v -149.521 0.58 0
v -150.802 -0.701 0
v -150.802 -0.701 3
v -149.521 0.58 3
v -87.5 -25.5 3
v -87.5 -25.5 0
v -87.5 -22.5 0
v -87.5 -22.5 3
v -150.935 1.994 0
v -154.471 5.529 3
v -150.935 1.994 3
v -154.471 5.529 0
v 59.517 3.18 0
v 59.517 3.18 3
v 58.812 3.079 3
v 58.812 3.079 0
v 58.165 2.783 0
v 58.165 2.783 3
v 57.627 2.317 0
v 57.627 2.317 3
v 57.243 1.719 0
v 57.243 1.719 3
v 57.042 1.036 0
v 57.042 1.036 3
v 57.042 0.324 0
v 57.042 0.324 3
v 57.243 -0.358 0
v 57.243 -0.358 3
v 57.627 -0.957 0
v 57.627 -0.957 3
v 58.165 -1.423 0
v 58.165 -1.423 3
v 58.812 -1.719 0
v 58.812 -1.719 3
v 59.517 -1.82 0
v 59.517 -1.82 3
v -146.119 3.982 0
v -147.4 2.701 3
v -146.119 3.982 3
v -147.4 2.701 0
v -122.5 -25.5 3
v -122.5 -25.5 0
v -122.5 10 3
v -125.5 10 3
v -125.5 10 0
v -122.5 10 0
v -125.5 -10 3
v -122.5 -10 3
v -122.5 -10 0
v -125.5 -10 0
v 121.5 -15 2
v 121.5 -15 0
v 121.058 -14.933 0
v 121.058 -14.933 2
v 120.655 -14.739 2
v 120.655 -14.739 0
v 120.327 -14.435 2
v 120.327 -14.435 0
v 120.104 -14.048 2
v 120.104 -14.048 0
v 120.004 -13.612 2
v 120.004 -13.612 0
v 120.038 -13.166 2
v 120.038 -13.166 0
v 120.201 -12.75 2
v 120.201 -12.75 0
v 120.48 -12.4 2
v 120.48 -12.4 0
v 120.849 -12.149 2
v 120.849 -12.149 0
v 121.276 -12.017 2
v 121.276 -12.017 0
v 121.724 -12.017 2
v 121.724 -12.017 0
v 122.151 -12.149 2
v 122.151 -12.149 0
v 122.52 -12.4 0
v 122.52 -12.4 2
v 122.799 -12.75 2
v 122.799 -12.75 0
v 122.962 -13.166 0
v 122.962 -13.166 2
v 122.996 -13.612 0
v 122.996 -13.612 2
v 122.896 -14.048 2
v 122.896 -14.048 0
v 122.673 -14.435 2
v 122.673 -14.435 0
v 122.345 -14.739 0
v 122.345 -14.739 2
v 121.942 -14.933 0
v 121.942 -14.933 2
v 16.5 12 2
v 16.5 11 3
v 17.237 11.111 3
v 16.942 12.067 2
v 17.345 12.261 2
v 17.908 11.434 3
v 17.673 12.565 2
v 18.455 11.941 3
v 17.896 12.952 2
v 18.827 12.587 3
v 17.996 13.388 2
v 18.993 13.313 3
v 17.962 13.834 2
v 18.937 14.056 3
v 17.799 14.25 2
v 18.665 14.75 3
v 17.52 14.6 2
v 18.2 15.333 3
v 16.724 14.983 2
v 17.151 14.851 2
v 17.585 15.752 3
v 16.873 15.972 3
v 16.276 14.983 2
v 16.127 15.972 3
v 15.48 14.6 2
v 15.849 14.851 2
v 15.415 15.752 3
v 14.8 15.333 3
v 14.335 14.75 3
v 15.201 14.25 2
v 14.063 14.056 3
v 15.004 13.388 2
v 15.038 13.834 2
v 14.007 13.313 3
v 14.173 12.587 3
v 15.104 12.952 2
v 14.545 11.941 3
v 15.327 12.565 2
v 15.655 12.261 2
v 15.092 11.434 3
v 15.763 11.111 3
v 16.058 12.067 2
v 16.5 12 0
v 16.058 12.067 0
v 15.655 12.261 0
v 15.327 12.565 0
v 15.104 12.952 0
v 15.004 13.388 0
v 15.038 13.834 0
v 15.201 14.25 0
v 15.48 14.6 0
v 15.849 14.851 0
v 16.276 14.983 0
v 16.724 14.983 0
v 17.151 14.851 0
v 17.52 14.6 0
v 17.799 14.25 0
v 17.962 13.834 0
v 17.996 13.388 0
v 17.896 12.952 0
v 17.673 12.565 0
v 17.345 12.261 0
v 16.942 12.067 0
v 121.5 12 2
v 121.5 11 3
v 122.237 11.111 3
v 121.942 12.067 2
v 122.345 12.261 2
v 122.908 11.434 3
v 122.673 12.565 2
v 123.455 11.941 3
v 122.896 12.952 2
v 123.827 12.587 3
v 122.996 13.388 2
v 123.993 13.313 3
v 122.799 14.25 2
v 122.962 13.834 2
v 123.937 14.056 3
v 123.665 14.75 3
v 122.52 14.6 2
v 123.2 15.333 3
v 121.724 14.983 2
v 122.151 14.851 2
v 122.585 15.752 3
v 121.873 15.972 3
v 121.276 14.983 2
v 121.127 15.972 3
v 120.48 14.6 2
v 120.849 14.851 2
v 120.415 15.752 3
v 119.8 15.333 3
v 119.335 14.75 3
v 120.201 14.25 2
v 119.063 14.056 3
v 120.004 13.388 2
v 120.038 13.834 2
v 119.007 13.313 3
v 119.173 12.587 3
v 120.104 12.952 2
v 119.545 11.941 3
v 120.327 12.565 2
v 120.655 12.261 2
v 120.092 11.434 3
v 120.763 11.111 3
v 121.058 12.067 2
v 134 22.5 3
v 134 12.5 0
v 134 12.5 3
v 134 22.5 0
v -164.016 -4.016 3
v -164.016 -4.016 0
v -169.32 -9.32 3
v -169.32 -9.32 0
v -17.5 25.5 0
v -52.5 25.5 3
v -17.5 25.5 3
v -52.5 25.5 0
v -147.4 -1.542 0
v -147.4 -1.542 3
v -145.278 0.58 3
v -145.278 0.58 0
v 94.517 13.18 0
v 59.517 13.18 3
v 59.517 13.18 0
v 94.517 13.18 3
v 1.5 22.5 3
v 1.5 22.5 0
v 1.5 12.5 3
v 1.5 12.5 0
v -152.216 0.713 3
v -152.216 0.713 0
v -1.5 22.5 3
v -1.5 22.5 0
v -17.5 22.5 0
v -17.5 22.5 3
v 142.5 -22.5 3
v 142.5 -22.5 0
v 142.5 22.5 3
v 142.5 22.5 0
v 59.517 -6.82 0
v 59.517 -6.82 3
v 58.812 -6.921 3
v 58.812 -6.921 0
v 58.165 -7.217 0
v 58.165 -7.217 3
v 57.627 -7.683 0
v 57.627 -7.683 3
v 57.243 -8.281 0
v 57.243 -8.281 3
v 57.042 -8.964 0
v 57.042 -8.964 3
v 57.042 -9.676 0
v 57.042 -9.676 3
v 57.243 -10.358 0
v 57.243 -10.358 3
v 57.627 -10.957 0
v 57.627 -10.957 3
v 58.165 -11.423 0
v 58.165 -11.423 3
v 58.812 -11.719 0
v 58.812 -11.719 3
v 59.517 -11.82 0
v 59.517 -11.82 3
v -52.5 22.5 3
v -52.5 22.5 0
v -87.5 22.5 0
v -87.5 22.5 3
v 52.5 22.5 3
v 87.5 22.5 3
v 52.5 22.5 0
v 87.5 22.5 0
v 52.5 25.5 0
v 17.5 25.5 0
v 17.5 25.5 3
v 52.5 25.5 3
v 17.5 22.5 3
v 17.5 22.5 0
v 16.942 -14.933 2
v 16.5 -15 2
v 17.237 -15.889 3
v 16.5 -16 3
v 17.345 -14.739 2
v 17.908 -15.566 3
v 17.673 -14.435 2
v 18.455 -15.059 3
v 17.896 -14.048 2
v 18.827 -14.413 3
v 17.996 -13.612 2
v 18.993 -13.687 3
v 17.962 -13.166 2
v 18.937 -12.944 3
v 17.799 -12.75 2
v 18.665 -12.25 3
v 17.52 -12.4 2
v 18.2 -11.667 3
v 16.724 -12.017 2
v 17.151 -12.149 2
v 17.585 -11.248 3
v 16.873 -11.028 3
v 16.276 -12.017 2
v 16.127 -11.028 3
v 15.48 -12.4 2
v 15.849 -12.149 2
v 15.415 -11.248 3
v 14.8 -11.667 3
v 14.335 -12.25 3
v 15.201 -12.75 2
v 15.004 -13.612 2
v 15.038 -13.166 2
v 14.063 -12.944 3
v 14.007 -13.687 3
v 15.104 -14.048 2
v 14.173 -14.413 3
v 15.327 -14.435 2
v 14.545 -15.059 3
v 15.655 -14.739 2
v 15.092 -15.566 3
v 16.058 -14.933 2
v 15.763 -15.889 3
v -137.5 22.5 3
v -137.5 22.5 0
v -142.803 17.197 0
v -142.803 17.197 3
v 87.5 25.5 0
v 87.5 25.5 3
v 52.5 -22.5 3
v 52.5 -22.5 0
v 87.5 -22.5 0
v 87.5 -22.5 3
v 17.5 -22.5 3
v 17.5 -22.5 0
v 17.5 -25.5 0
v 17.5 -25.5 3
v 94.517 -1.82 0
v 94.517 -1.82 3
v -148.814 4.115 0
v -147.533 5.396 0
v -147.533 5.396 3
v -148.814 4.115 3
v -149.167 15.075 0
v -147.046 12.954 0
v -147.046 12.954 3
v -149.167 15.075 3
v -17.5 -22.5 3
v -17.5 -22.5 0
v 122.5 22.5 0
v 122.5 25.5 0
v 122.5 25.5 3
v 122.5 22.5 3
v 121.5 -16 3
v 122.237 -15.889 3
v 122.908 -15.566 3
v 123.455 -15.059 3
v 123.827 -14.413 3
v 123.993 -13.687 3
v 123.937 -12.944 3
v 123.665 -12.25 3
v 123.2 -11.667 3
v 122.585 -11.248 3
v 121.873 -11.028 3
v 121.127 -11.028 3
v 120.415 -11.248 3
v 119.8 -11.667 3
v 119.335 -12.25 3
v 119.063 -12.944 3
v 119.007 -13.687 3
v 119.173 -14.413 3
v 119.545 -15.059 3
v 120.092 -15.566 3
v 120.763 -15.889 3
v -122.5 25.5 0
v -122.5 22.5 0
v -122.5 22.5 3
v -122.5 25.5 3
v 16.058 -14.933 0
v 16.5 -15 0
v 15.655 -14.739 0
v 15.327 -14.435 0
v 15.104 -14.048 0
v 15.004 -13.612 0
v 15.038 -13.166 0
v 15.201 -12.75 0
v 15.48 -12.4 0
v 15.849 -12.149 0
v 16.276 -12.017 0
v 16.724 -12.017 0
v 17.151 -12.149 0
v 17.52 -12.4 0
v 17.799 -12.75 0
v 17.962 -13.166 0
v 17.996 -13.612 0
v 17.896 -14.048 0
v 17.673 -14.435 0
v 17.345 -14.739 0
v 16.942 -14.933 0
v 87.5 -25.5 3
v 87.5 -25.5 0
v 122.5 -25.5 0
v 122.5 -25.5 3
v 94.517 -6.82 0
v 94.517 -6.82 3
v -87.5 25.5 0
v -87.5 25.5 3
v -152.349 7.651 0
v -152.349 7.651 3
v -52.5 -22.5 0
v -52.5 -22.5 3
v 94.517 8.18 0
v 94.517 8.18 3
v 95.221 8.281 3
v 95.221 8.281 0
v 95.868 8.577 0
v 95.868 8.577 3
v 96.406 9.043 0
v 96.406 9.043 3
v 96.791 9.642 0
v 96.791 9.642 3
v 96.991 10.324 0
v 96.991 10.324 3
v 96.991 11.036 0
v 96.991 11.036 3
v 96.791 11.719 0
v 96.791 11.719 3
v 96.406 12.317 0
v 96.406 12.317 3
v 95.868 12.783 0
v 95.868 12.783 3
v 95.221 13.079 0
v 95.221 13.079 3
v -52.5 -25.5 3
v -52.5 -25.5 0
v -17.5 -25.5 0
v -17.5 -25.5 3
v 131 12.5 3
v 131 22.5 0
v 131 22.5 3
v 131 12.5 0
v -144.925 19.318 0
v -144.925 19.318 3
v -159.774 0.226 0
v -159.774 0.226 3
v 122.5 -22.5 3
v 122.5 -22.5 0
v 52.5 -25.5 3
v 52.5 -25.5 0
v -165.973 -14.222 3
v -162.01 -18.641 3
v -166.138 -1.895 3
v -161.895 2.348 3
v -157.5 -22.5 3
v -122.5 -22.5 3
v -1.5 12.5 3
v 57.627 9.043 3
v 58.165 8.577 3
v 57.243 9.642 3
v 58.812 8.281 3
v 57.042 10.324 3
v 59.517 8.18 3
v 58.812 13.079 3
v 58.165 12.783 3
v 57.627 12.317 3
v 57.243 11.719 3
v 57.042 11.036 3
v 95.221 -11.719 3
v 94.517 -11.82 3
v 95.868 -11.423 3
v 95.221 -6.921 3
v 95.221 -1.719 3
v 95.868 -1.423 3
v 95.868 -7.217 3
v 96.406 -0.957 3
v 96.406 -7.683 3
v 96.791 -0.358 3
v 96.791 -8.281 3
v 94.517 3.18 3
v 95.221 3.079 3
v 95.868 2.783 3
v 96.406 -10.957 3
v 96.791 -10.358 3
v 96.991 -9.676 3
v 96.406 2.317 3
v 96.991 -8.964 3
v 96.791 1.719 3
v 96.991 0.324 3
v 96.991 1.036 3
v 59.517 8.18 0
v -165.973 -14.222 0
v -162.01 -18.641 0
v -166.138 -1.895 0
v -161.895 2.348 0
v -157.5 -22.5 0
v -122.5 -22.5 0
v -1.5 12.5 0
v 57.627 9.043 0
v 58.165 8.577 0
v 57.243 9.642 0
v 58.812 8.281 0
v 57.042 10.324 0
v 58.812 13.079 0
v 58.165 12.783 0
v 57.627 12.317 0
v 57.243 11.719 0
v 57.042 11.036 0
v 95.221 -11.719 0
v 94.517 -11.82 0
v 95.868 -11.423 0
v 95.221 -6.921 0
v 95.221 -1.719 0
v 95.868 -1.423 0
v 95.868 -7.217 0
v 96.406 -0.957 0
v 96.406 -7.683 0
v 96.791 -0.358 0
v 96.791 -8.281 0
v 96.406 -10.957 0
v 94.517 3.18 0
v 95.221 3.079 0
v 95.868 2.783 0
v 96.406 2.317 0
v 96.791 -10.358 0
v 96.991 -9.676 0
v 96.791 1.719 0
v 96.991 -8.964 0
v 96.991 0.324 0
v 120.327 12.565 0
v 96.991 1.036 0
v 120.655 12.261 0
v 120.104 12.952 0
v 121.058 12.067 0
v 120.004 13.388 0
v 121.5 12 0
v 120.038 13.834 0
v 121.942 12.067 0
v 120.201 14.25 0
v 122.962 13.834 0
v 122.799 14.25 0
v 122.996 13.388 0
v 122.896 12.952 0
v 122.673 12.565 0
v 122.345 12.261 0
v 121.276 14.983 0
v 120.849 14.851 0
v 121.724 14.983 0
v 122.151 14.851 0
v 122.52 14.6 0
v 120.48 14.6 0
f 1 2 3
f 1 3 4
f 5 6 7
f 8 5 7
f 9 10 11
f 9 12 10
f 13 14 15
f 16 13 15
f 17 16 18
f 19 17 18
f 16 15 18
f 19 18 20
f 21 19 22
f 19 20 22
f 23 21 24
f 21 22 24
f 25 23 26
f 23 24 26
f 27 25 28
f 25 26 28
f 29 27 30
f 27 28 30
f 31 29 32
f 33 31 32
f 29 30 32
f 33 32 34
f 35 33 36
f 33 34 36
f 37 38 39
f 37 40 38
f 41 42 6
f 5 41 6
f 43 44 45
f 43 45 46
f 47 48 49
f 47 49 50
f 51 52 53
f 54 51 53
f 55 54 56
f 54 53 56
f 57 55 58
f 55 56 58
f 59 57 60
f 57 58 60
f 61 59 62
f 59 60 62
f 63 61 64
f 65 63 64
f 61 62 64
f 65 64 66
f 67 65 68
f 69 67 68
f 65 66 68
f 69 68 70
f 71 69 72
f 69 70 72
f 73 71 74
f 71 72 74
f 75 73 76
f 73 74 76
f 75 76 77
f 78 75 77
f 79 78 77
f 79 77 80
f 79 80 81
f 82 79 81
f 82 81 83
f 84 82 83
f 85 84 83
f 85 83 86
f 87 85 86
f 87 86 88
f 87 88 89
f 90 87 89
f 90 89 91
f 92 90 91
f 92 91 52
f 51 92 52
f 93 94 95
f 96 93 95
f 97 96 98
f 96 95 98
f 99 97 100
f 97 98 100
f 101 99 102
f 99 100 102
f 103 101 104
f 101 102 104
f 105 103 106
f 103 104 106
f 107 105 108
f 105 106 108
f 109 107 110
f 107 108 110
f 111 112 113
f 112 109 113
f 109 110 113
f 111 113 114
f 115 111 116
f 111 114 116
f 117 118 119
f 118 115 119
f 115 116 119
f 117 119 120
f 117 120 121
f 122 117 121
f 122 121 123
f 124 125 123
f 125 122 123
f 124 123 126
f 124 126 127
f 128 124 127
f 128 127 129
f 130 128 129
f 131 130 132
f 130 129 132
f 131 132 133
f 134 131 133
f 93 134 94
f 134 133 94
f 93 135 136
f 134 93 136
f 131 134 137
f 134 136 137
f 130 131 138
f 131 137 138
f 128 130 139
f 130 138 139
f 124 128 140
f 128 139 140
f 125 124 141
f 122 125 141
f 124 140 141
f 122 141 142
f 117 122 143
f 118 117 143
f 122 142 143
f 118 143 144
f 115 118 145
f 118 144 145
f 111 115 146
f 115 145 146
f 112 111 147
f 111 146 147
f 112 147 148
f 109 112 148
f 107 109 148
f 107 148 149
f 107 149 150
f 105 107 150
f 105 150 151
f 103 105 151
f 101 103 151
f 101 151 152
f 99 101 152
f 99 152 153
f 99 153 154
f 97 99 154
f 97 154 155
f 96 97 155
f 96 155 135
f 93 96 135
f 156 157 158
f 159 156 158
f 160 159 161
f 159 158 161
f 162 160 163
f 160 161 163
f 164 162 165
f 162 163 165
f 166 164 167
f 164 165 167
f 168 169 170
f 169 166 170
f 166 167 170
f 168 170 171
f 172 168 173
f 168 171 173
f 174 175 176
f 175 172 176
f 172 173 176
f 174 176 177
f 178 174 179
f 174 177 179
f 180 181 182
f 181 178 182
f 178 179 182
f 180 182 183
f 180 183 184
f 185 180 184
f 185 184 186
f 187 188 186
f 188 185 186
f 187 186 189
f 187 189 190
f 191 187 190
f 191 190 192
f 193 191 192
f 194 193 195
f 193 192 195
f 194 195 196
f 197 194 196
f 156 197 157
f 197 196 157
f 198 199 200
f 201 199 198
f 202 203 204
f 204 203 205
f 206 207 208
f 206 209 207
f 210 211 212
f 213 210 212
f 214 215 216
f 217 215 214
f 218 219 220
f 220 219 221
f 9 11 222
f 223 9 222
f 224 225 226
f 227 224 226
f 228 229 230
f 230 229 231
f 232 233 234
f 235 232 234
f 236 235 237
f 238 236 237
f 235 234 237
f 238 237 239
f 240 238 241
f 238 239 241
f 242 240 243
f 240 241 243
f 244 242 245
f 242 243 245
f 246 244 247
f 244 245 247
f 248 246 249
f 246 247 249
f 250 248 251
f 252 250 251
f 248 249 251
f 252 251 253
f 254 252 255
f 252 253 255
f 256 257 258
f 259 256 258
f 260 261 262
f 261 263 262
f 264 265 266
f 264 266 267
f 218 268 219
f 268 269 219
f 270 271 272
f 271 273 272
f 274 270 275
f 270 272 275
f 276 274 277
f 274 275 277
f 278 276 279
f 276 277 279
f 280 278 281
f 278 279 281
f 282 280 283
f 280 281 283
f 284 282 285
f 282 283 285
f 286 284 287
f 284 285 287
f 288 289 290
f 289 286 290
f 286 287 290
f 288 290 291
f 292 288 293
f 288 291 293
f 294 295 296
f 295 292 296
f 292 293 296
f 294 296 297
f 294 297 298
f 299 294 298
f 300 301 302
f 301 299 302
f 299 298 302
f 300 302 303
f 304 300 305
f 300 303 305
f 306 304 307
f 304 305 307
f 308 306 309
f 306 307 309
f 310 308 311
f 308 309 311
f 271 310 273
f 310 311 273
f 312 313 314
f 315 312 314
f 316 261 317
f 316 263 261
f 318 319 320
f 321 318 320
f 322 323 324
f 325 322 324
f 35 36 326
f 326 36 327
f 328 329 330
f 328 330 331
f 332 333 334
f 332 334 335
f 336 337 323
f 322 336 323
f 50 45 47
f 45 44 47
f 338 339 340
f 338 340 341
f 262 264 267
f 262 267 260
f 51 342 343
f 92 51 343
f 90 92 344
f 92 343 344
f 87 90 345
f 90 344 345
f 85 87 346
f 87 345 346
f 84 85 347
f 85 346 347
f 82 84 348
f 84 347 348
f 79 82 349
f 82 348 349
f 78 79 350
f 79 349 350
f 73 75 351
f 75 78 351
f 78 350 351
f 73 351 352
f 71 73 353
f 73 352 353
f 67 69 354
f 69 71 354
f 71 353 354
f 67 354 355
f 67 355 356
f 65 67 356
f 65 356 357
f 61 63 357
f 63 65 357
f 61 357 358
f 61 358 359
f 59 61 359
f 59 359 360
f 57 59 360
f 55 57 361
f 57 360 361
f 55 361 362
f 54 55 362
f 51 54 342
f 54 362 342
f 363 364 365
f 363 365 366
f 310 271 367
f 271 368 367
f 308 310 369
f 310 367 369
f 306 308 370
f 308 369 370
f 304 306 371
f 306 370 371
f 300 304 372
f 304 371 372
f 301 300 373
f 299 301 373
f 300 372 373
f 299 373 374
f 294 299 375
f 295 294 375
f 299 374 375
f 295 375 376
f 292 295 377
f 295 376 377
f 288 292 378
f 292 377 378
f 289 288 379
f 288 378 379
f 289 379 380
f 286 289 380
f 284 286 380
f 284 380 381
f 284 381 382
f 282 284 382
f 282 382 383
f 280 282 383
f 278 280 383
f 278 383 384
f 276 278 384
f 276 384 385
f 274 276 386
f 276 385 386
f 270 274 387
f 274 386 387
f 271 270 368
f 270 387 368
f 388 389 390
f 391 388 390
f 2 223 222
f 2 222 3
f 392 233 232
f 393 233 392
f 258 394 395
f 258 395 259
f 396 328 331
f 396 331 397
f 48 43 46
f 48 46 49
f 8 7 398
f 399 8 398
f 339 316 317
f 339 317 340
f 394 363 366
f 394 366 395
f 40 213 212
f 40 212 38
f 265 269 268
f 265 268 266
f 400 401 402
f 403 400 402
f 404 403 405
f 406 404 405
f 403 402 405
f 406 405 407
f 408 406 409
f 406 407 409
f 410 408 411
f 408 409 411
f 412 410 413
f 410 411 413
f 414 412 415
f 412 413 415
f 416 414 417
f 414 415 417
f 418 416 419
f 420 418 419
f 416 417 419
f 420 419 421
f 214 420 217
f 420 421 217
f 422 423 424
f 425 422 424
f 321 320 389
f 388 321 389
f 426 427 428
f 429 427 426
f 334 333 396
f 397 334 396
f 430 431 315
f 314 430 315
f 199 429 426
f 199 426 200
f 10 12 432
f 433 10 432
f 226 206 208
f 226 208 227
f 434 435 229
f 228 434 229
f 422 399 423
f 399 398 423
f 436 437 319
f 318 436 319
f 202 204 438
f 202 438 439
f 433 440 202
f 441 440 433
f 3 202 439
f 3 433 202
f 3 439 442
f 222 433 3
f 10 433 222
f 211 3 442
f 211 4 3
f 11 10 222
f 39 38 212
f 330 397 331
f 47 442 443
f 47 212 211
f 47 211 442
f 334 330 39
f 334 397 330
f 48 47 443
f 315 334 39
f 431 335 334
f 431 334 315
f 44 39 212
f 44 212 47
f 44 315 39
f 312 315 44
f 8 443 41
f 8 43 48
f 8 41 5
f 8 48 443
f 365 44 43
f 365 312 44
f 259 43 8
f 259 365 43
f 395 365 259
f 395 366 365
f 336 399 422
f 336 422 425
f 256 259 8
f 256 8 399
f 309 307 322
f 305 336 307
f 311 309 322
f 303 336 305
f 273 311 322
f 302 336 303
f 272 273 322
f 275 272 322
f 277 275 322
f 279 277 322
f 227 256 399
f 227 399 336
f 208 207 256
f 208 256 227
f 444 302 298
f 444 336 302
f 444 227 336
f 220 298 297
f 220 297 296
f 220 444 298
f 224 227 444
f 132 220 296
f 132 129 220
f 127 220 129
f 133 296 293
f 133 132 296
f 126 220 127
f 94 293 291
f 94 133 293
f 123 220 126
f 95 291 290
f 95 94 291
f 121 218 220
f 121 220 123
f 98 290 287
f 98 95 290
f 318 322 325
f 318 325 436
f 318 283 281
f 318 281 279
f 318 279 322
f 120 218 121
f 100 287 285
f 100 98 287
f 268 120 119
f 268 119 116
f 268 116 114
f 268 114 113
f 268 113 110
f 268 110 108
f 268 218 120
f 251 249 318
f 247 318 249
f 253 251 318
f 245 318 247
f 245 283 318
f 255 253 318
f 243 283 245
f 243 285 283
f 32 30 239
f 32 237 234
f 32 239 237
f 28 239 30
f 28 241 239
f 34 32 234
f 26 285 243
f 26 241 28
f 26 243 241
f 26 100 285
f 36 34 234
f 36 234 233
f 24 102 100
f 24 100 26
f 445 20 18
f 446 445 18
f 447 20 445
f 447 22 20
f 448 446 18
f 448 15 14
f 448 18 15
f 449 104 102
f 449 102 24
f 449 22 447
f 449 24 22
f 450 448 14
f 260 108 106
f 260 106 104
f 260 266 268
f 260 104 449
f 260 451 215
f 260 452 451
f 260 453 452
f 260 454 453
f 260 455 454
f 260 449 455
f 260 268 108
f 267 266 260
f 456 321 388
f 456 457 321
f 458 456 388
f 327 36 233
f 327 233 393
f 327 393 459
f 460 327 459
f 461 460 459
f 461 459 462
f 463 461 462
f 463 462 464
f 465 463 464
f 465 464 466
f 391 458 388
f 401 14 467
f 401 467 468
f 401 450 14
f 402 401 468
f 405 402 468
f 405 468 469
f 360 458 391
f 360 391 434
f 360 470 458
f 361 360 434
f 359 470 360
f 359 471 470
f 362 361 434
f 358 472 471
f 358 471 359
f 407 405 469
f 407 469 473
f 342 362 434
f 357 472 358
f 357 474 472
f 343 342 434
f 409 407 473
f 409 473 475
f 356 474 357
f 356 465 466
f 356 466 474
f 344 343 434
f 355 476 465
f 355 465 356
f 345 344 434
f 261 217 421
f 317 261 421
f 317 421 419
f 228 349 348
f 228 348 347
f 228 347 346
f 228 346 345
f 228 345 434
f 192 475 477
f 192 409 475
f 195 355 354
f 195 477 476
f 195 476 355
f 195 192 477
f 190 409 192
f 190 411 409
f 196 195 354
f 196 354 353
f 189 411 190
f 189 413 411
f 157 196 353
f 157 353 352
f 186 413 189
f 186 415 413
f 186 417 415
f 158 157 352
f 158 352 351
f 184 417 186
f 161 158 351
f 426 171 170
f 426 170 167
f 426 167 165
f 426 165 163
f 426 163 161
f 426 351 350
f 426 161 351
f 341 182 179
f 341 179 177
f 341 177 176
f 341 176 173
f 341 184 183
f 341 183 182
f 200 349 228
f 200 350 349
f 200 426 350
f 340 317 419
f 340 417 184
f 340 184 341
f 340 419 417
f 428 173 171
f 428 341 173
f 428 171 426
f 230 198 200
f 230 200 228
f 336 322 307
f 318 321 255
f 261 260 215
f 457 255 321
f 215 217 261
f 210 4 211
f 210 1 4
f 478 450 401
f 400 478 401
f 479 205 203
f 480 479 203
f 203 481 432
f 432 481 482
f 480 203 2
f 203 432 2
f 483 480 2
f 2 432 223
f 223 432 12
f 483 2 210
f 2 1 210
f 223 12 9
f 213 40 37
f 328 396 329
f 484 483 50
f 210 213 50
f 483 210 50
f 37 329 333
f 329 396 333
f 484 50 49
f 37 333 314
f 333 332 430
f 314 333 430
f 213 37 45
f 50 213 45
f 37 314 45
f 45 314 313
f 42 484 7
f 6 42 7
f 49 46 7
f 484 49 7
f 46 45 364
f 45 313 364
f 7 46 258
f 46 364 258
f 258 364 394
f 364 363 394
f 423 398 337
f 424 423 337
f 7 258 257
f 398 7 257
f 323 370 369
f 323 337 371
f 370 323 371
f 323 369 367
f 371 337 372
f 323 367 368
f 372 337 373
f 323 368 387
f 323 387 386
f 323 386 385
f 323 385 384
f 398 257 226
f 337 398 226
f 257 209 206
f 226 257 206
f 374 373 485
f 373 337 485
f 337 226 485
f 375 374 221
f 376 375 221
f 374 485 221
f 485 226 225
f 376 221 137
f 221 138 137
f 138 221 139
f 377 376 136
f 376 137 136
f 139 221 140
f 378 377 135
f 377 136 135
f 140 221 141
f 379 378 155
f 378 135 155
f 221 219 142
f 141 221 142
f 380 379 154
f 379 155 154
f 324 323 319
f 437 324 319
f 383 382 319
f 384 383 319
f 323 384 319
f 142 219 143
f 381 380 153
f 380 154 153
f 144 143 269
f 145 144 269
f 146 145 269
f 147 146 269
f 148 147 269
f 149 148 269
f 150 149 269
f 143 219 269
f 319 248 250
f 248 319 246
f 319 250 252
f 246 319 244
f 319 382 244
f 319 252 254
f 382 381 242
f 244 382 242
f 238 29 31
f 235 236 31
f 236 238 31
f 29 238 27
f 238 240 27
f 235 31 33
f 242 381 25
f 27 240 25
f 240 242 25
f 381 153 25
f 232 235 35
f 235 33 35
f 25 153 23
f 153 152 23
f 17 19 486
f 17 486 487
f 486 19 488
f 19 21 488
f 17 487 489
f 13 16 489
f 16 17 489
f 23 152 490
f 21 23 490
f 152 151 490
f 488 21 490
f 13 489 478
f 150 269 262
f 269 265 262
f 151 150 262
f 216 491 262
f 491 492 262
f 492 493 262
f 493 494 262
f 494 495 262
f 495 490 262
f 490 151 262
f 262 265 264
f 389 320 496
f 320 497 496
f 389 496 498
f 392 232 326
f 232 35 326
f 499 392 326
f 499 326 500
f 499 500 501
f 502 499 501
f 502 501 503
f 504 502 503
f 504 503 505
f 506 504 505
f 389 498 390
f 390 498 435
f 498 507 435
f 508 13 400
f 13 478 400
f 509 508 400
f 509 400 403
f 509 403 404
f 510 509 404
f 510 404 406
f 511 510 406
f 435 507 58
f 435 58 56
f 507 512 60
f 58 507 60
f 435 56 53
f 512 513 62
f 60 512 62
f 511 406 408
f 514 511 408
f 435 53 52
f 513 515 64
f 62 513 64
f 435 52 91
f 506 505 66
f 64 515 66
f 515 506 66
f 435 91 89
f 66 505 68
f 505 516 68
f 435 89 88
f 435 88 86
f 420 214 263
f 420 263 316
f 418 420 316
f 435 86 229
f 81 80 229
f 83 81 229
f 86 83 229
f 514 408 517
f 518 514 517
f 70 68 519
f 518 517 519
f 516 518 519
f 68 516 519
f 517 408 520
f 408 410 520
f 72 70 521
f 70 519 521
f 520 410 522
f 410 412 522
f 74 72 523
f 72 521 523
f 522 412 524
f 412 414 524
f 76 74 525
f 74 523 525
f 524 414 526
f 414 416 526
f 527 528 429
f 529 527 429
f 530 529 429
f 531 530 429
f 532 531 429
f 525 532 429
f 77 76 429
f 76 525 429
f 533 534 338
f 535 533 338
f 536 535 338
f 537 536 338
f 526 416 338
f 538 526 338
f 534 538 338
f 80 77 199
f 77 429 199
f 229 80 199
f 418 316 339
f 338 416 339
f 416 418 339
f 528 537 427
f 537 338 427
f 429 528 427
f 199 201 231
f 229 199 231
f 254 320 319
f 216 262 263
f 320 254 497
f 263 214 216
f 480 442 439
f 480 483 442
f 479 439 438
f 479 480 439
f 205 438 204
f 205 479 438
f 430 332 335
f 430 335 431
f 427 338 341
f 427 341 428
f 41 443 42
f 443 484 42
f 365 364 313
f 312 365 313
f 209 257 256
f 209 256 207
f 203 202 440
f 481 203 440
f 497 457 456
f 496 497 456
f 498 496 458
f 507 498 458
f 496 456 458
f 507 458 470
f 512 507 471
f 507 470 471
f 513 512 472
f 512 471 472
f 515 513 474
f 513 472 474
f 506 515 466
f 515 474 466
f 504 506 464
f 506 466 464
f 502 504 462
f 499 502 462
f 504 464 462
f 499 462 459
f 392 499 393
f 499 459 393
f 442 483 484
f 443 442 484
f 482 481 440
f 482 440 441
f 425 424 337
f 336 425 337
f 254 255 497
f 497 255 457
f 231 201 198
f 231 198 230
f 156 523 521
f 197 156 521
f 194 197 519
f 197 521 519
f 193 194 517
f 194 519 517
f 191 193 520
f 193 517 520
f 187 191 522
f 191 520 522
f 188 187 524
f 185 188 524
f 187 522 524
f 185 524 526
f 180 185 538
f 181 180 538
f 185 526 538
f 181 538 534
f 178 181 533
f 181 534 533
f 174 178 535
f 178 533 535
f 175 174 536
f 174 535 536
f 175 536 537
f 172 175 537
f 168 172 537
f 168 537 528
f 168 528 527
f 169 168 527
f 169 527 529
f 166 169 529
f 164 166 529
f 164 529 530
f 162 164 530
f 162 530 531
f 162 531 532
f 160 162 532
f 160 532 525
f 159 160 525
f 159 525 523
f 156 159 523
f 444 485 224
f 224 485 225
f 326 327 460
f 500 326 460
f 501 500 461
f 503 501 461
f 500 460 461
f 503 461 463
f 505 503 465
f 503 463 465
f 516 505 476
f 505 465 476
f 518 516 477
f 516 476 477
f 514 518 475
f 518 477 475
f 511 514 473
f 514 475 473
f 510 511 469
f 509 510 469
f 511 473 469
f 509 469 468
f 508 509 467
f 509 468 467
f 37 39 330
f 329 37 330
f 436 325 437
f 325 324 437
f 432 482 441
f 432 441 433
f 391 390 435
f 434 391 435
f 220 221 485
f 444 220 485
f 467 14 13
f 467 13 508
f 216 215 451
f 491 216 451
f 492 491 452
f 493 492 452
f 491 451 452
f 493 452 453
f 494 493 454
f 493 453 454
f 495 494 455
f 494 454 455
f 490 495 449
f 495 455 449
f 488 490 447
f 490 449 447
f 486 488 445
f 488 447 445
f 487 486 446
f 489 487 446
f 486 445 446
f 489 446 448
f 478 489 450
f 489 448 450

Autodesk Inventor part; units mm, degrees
ref_plane "YZ Plane" through (0, 0, 0) normal (1, 0, 0) x (0, 1, 0)
ref_plane "XZ Plane" through (0, 0, 0) normal (0, 1, 0) x (-1, 0, 0)
ref_plane "XY Plane" through (0, 0, 0) normal (0, 0, 1) x (1, 0, 0)
sketch "Sketch1" plane through (0, 0, 0) normal (0, 0, 1) x (1, 0, 0)
  line L0 (142.5, -22.5) -> (142.5, 22.5)
  arc A0 (-169.3198, -9.3198) -> (-157.5, -22.5) centre (-130.5627, 13.547) ccw
  line L1 (-154.4706, 5.5294) -> (-150.935, 1.9939)
  line L2 (-150.935, 1.9939) -> (-152.2157, 0.7132)
  line L3 (-152.2157, 0.7132) -> (-150.8015, -0.701)
  line L4 (-150.8015, -0.701) -> (-149.5208, 0.5797)
  line L5 (-149.5208, 0.5797) -> (-147.3995, -1.5416)
  line L6 (-147.3995, -1.5416) -> (-145.2782, 0.5797)
  line L7 (-145.2782, 0.5797) -> (-147.3995, 2.701)
  line L8 (-147.3995, 2.701) -> (-146.1188, 3.9817)
  line L9 (-146.1188, 3.9817) -> (-147.533, 5.3959)
  line L10 (-147.533, 5.3959) -> (-148.8137, 4.1152)
  line L11 (-148.8137, 4.1152) -> (-152.3492, 7.6508)
  line L12 (-154.542, 7.7222) -> (-156.666, 9.8462) construction
  line L13 (-122.5, 22.5) -> (-122.5, 25.5)
  line L14 (-122.5, 25.5) -> (-87.5, 25.5)
  line L15 (-87.5, 25.5) -> (-87.5, 22.5)
  line L16 (-52.5, 22.5) -> (-52.5, 25.5)
  line L17 (-52.5, 25.5) -> (-17.5, 25.5)
  line L18 (-17.5, 25.5) -> (-17.5, 22.5)
  line L19 (17.5, 22.5) -> (17.5, 25.5)
  line L20 (17.5, 25.5) -> (52.5, 25.5)
  line L21 (52.5, 25.5) -> (52.5, 22.5)
  line L22 (87.5, 22.5) -> (87.5, 25.5)
  line L23 (87.5, 25.5) -> (122.5, 25.5)
  line L24 (122.5, 25.5) -> (122.5, 22.5)
  line L25 (87.5, 22.5) -> (52.5, 22.5)
  line L26 (-52.5, 22.5) -> (-87.5, 22.5)
  line L27 (-122.5, 22.5) -> (-137.5, 22.5)
  line L28 (-122.5, -22.5) -> (-122.5, -25.5)
  line L29 (-122.5, -25.5) -> (-87.5, -25.5)
  line L30 (-87.5, -25.5) -> (-87.5, -22.5)
  line L31 (-52.5, -22.5) -> (-52.5, -25.5)
  line L32 (-52.5, -25.5) -> (-17.5, -25.5)
  line L33 (-17.5, -25.5) -> (-17.5, -22.5)
  line L34 (17.5, -22.5) -> (17.5, -25.5)
  line L35 (17.5, -25.5) -> (52.5, -25.5)
  line L36 (52.5, -25.5) -> (52.5, -22.5)
  line L37 (87.5, -22.5) -> (87.5, -25.5)
  line L38 (87.5, -25.5) -> (122.5, -25.5)
  line L39 (122.5, -25.5) -> (122.5, -22.5)
  line L40 (-157.5, -22.5) -> (-122.5, -22.5)
  line L41 (-87.5, -22.5) -> (-52.5, -22.5)
  line L42 (-17.5, -22.5) -> (17.5, -22.5)
  line L43 (52.5, -22.5) -> (87.5, -22.5)
  line L44 (122.5, -22.5) -> (142.5, -22.5)
  line L45 (-1.5, 12.5) -> (-1.5, 22.5)
  line L46 (1.5, 22.5) -> (1.5, 12.5)
  line L47 (1.5, 12.5) -> (-1.5, 12.5)
  line L48 (-37.337, 0) -> (-30.889, 0) construction
  line L49 (-164.0165, -4.0165) -> (-166.1378, -1.8952)
  line L50 (-166.1378, -1.8952) -> (-161.8952, 2.3475)
  line L51 (-161.8952, 2.3475) -> (-159.7739, 0.2261)
  line L52 (-147.0459, 12.9541) -> (-149.1673, 15.0754)
  line L53 (-149.1673, 15.0754) -> (-144.9246, 19.318)
  line L54 (-144.9246, 19.318) -> (-142.8033, 17.1967)
  line L55 (-154.4706, 5.5294) -> (-159.7739, 0.2261)
  line L56 (-164.0165, -4.0165) -> (-169.3198, -9.3198)
  line L57 (-137.5, 22.5) -> (-142.8033, 17.1967)
  line L58 (-147.0459, 12.9541) -> (-152.3492, 7.6508)
  line L59 (17.5, 22.5) -> (1.5, 22.5)
  line L60 (-1.5, 22.5) -> (-17.5, 22.5)
  line L61 (131, 22.5) -> (131, 12.5)
  line L62 (131, 12.5) -> (134, 12.5)
  line L63 (134, 12.5) -> (134, 22.5)
  line L64 (122.5, 22.5) -> (131, 22.5)
  line L65 (134, 22.5) -> (142.5, 22.5)
  point P0 (0, 0)
  point P1 (142.5, 0)
  point P2 (-146.3388, -0.481)
  point P3 (0, -22.5)
  point P4 (1.5, -22.5)
  dimension "d0" = 45
  dimension "d2" = 45
  dimension "d4" = 45
  dimension "d7" = 3
  dimension "d8" = 2
  dimension "d9" = 3
  dimension "d10" = 5
  dimension "d11" = 6.6223
  dimension "d13" = 35
  dimension "d15" = 20
  dimension "d17" = 10
  dimension "d23" = 45
  dimension "d24" = 6
  dimension "d25" = 18
  dimension "d35" = 3
  dimension "d36" = 35
  dimension "d37" = 15
  dimension "d38" = 300
  dimension "d40" = 8.5
extrude "Extrusion1" add sketch "Sketch1" along normal blind 3
sketch "Sketch2" plane through (0, 0, 3) normal (0, 0, 1) x (1, 0, 0)
  line L0 (1.5, 22.5) -> (1.5, 12.5) projected
  line L1 (142.5, -22.5) -> (142.5, 22.5) projected
  line L2 (122.5, 22.5) -> (122.5, 25.5) projected
  line L3 (122.5, 25.5) -> (87.5, 25.5) projected
  line L4 (87.5, 25.5) -> (87.5, 22.5) projected
  line L5 (87.5, 22.5) -> (52.5, 22.5) projected
  line L6 (52.5, 22.5) -> (52.5, 25.5) projected
  line L7 (52.5, 25.5) -> (17.5, 25.5) projected
  line L8 (17.5, 25.5) -> (17.5, 22.5) projected
  line L9 (17.5, 22.5) -> (1.5, 22.5) projected
  line L10 (-17.5, -22.5) -> (17.5, -22.5) projected
  line L11 (17.5, -22.5) -> (17.5, -25.5) projected
  line L12 (17.5, -25.5) -> (52.5, -25.5) projected
  line L13 (52.5, -25.5) -> (52.5, -22.5) projected
  line L14 (52.5, -22.5) -> (87.5, -22.5) projected
  line L15 (87.5, -22.5) -> (87.5, -25.5) projected
  line L16 (87.5, -25.5) -> (122.5, -25.5) projected
  line L17 (122.5, -25.5) -> (122.5, -22.5) projected
  line L18 (122.5, -22.5) -> (142.5, -22.5) projected
  line L19 (-125.5, 10) -> (-125.5, -10)
  line L20 (131, 22.5) -> (122.5, 22.5) projected
  line L21 (1.5, 12.5) -> (-1.5, 12.5) projected
  line L22 (-1.5, 12.5) -> (-1.5, 22.5) projected
  line L23 (-1.5, 22.5) -> (-17.5, 22.5) projected
  line L24 (-17.5, 22.5) -> (-17.5, 25.5) projected
  line L25 (-17.5, 25.5) -> (-52.5, 25.5) projected
  line L26 (-52.5, 25.5) -> (-52.5, 22.5) projected
  line L27 (-52.5, 22.5) -> (-87.5, 22.5) projected
  line L28 (-87.5, 22.5) -> (-87.5, 25.5) projected
  line L29 (-87.5, 25.5) -> (-122.5, 25.5) projected
  line L30 (-122.5, 25.5) -> (-122.5, 22.5) projected
  line L31 (-122.5, -25.5) -> (-87.5, -25.5) projected
  line L32 (-87.5, -25.5) -> (-87.5, -22.5) projected
  line L33 (-87.5, -22.5) -> (-52.5, -22.5) projected
  line L34 (-52.5, -22.5) -> (-52.5, -25.5) projected
  line L35 (-52.5, -25.5) -> (-17.5, -25.5) projected
  line L36 (-17.5, -25.5) -> (-17.5, -22.5) projected
  line L37 (-122.5, 22.5) -> (-137.5, 22.5) projected
  line L38 (-137.5, 22.5) -> (-142.8033, 17.1967) projected
  line L39 (-142.8033, 17.1967) -> (-144.9246, 19.318) projected
  line L40 (-144.9246, 19.318) -> (-149.1673, 15.0754) projected
  line L41 (-149.1673, 15.0754) -> (-147.0459, 12.9541) projected
  line L42 (-147.0459, 12.9541) -> (-152.3492, 7.6508) projected
  line L43 (-152.3492, 7.6508) -> (-148.8137, 4.1152) projected
  line L44 (-148.8137, 4.1152) -> (-147.533, 5.3959) projected
  line L45 (-147.533, 5.3959) -> (-146.1188, 3.9817) projected
  line L46 (-146.1188, 3.9817) -> (-147.3995, 2.701) projected
  line L47 (-147.3995, 2.701) -> (-145.2782, 0.5797) projected
  line L48 (-157.5, -22.5) -> (-122.5, -22.5) projected
  line L49 (-122.5, -22.5) -> (-122.5, -25.5) projected
  line L50 (-145.2782, 0.5797) -> (-147.3995, -1.5416) projected
  line L51 (-147.3995, -1.5416) -> (-149.5208, 0.5797) projected
  line L52 (-149.5208, 0.5797) -> (-150.8015, -0.701) projected
  line L53 (-150.8015, -0.701) -> (-152.2157, 0.7132) projected
  line L54 (-152.2157, 0.7132) -> (-150.935, 1.9939) projected
  line L55 (-150.935, 1.9939) -> (-154.4706, 5.5294) projected
  line L56 (-154.4706, 5.5294) -> (-159.7739, 0.2261) projected
  line L57 (-159.7739, 0.2261) -> (-161.8952, 2.3475) projected
  line L58 (-161.8952, 2.3475) -> (-166.1378, -1.8952) projected
  line L59 (-166.1378, -1.8952) -> (-164.0165, -4.0165) projected
  line L60 (-164.0165, -4.0165) -> (-169.3198, -9.3198) projected
  arc A0 (-169.3198, -9.3198) -> (-157.5, -22.5) centre (-130.5627, 13.547) ccw projected
  line L61 (142.5, 22.5) -> (134, 22.5) projected
  line L62 (134, 22.5) -> (134, 12.5) projected
  line L63 (134, 12.5) -> (131, 12.5) projected
  line L64 (131, 12.5) -> (131, 22.5) projected
  line L65 (-125.5, 10) -> (-122.5, 10)
  line L66 (-122.5, 10) -> (-122.5, -10)
  line L67 (-122.5, -10) -> (-125.5, -10)
  line L68 (-87.5, 22.5) -> (-87.5, 25.5) projected
  point P0 (0, 0)
  point P1 (-125.5, 0)
  dimension "d20" = 268
  dimension "d39" = 20
extrude "Extrusion2" cut sketch "Sketch2" against normal blind 10 contours L65 L66 L67 L19
sketch "Sketch3" plane through (0, 0, 3) normal (0, 0, 1) x (1, 0, 0)
  line L0 (1.5, 22.5) -> (1.5, 12.5) projected
  line L1 (142.5, -22.5) -> (142.5, 22.5) projected
  line L2 (122.5, 22.5) -> (122.5, 25.5) projected
  line L3 (122.5, 25.5) -> (87.5, 25.5) projected
  line L4 (87.5, 25.5) -> (87.5, 22.5) projected
  line L5 (87.5, 22.5) -> (52.5, 22.5) projected
  line L6 (52.5, 22.5) -> (52.5, 25.5) projected
  line L7 (52.5, 25.5) -> (17.5, 25.5) projected
  line L8 (17.5, 25.5) -> (17.5, 22.5) projected
  line L9 (17.5, 22.5) -> (1.5, 22.5) projected
  line L10 (-17.5, -22.5) -> (17.5, -22.5) projected
  line L11 (17.5, -22.5) -> (17.5, -25.5) projected
  line L12 (17.5, -25.5) -> (52.5, -25.5) projected
  line L13 (52.5, -25.5) -> (52.5, -22.5) projected
  line L14 (52.5, -22.5) -> (87.5, -22.5) projected
  line L15 (87.5, -22.5) -> (87.5, -25.5) projected
  line L16 (87.5, -25.5) -> (122.5, -25.5) projected
  line L17 (122.5, -25.5) -> (122.5, -22.5) projected
  line L18 (122.5, -22.5) -> (142.5, -22.5) projected
  arc A0 (59.5166, -6.8198) -> (59.5166, -11.8198) centre (59.5166, -9.3198) ccw
  arc A1 (94.5166, -11.8198) -> (94.5166, -6.8198) centre (94.5166, -9.3198) ccw
  line L19 (59.5166, -6.8198) -> (94.5166, -6.8198)
  line L20 (59.5166, -11.8198) -> (94.5166, -11.8198)
  line L21 (131, 22.5) -> (122.5, 22.5) projected
  line L22 (1.5, 12.5) -> (-1.5, 12.5) projected
  line L23 (-1.5, 12.5) -> (-1.5, 22.5) projected
  line L24 (-1.5, 22.5) -> (-17.5, 22.5) projected
  line L25 (-17.5, 22.5) -> (-17.5, 25.5) projected
  line L26 (-17.5, 25.5) -> (-52.5, 25.5) projected
  line L27 (-52.5, 25.5) -> (-52.5, 22.5) projected
  line L28 (-52.5, 22.5) -> (-87.5, 22.5) projected
  line L29 (-87.5, 22.5) -> (-87.5, 25.5) projected
  line L30 (-87.5, 25.5) -> (-122.5, 25.5) projected
  line L31 (-122.5, -22.5) -> (-122.5, -25.5) projected
  line L32 (-122.5, -25.5) -> (-87.5, -25.5) projected
  line L33 (-87.5, -25.5) -> (-87.5, -22.5) projected
  line L34 (-87.5, -22.5) -> (-52.5, -22.5) projected
  line L35 (-52.5, -22.5) -> (-52.5, -25.5) projected
  line L36 (-52.5, -25.5) -> (-17.5, -25.5) projected
  line L37 (-17.5, -25.5) -> (-17.5, -22.5) projected
  line L38 (-122.5, 22.5) -> (-137.5, 22.5) projected
  line L39 (-137.5, 22.5) -> (-142.8033, 17.1967) projected
  line L40 (-142.8033, 17.1967) -> (-144.9246, 19.318) projected
  line L41 (-144.9246, 19.318) -> (-149.1673, 15.0754) projected
  line L42 (-149.1673, 15.0754) -> (-147.0459, 12.9541) projected
  line L43 (-147.0459, 12.9541) -> (-152.3492, 7.6508) projected
  line L44 (-157.5, -22.5) -> (-122.5, -22.5) projected
  line L45 (-164.0165, -4.0165) -> (-169.3198, -9.3198) projected
  arc A2 (-169.3198, -9.3198) -> (-157.5, -22.5) centre (-130.5627, 13.547) ccw projected
  line L46 (-125.5, -10) -> (-125.5, 10) projected
  line L47 (142.5, 22.5) -> (134, 22.5) projected
  line L48 (134, 22.5) -> (134, 12.5) projected
  line L49 (134, 12.5) -> (131, 12.5) projected
  line L50 (131, 12.5) -> (131, 22.5) projected
  line L51 (-122.5, -10) -> (-125.5, -10) projected
  line L52 (-125.5, 10) -> (-122.5, 10) projected
  line L53 (-122.5, 10) -> (-122.5, -10) projected
  line L54 (-152.3492, 7.6508) -> (-148.8137, 4.1152) projected
  line L55 (-148.8137, 4.1152) -> (-147.533, 5.3959) projected
  line L56 (-147.533, 5.3959) -> (-146.1188, 3.9817) projected
  line L57 (-146.1188, 3.9817) -> (-147.3995, 2.701) projected
  line L58 (-147.3995, 2.701) -> (-145.2782, 0.5797) projected
  line L59 (-145.2782, 0.5797) -> (-147.3995, -1.5416) projected
  line L60 (-147.3995, -1.5416) -> (-149.5208, 0.5797) projected
  line L61 (-149.5208, 0.5797) -> (-150.8015, -0.701) projected
  line L62 (-150.8015, -0.701) -> (-152.2157, 0.7132) projected
  line L63 (-152.2157, 0.7132) -> (-150.935, 1.9939) projected
  line L64 (-150.935, 1.9939) -> (-154.4706, 5.5294) projected
  line L65 (-154.4706, 5.5294) -> (-159.7739, 0.2261) projected
  line L66 (-159.7739, 0.2261) -> (-161.8952, 2.3475) projected
  line L67 (-161.8952, 2.3475) -> (-166.1378, -1.8952) projected
  line L68 (-166.1378, -1.8952) -> (-164.0165, -4.0165) projected
  line L69 (-122.5, 25.5) -> (-122.5, 22.5) projected
  point P0 (0, 0)
  dimension "d26" = 5
  dimension "d27" = 35
extrude "Extrusion3" cut sketch "Sketch3" against normal up to next contours L19 A1 L20 A0
pattern_linear "Rectangular Pattern1" count 3 spacing 10 along (0, 1, 0) of "Extrusion3"
sketch "Sketch4" plane through (0, 0, 3) normal (0, 0, 1) x (1, 0, 0)
  line L0 (1.5, 22.5) -> (1.5, 12.5) projected
  line L1 (-17.4416, 0) -> (12.3581, 0) construction
  point P0 (0, 0)
  point P1 (16.5, 13.5)
  point P2 (16.5, -13.5)
  point P3 (121.5, 13.5)
  point P4 (121.5, -13.5)
  dimension "d41" = 27
  dimension "d42" = 15
  dimension "d43" = 105
hole "Hole1" at (16.5, 13.5, 3) at (16.5, -13.5, 3) at (121.5, 13.5, 3) at (121.5, -13.5, 3) direction (0, 0, -1) diameter 3 end through all countersink diameter 5 countersink angle 90
properties part number "Wall" material "Polycarbonate, Clear"
